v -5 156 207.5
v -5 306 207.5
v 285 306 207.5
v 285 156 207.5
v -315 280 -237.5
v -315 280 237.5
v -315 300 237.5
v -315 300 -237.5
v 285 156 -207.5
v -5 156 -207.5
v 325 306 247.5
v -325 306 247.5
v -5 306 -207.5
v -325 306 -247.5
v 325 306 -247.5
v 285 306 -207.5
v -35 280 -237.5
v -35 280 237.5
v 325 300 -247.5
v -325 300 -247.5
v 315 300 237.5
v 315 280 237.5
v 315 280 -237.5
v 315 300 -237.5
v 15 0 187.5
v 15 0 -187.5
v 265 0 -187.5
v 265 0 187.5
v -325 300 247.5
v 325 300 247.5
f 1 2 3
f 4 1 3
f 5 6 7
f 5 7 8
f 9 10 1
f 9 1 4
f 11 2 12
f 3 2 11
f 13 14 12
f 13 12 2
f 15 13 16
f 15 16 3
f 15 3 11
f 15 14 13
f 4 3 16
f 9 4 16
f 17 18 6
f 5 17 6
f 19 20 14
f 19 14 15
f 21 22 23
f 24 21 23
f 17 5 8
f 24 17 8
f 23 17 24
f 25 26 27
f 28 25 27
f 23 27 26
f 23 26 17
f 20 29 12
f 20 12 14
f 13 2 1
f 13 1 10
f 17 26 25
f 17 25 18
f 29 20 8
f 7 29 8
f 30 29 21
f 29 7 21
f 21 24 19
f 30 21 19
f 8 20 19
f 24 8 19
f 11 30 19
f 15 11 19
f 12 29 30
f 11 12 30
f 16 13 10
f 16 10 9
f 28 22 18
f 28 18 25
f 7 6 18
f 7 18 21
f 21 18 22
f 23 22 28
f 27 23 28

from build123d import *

# Parameters (mm, degrees)
SKETCH_1_W               = 630
SKETCH_1_H               = 475
EXTRUDE_1_DEPTH          = 300
CUT_EXTRUDE_1_DEPTH      = 1
CUT_EXTRUDE_1_DEPTH_BACK = 476
SKETCH_3_W               = 650
SKETCH_3_H               = 495
EXTRUDE_2_DEPTH          = 6
CUT_EXTRUDE_2_DEPTH      = 11
CUT_EXTRUDE_2_DEPTH_BACK = 641
SKETCH_5_W               = 290
SKETCH_5_H               = 415
CUT_EXTRUDE_4_DEPTH      = 150


with BuildPart() as part:
    # Эскиз1 → Бобышка-Вытянуть1 (new body)
    with BuildSketch(Plane(origin=(0, 0, 0), x_dir=(1, 0, 0), z_dir=(0, 1, 0))):
        Rectangle(SKETCH_1_W, SKETCH_1_H)
    extrude(amount=EXTRUDE_1_DEPTH)

    # Эскиз2 → Вырез-Вытянуть1 (cut, two sides)
    with BuildSketch(Plane.XY.offset(237.5)) as cut_extrude_1_sk:
        Polygon((-315, 0), (15, 0), (-35, 280), (-315, 280), align=None)
        Polygon((315, 280), (265, 0), (315, 0), align=None)
    extrude(amount=CUT_EXTRUDE_1_DEPTH, mode=Mode.SUBTRACT)
    extrude(cut_extrude_1_sk.sketch, amount=-CUT_EXTRUDE_1_DEPTH_BACK, mode=Mode.SUBTRACT)

    # Эскиз3 → Бобышка-Вытянуть2 (add)
    with BuildSketch(Plane(origin=(0, 300, 0), x_dir=(1, 0, 0), z_dir=(0, 1, 0))):
        Rectangle(SKETCH_3_W, SKETCH_3_H)
    extrude(amount=EXTRUDE_2_DEPTH)

    # Эскиз4 → Вырез-Вытянуть2 (cut, two sides)
    with BuildSketch(Plane(origin=(315, 0, 0), x_dir=(0, 0, -1), z_dir=(1, 0, 0))) as cut_extrude_2_sk:
        Polygon((-237.5, 280), (-187.5, 0), (-237.5, 0), align=None)
        Polygon((237.5, 280), (237.5, 0), (187.5, 0), align=None)
    extrude(amount=CUT_EXTRUDE_2_DEPTH, mode=Mode.SUBTRACT)
    extrude(cut_extrude_2_sk.sketch, amount=-CUT_EXTRUDE_2_DEPTH_BACK, mode=Mode.SUBTRACT)

    # Эскиз5 → Вырез-Вытянуть4 (cut)
    with BuildSketch(Plane(origin=(0, 306, 0), x_dir=(1, 0, 0), z_dir=(0, 1, 0))):
        with Locations((140, 0)):
            Rectangle(SKETCH_5_W, SKETCH_5_H)
    extrude(amount=-CUT_EXTRUDE_4_DEPTH, mode=Mode.SUBTRACT)


solid = part.part
